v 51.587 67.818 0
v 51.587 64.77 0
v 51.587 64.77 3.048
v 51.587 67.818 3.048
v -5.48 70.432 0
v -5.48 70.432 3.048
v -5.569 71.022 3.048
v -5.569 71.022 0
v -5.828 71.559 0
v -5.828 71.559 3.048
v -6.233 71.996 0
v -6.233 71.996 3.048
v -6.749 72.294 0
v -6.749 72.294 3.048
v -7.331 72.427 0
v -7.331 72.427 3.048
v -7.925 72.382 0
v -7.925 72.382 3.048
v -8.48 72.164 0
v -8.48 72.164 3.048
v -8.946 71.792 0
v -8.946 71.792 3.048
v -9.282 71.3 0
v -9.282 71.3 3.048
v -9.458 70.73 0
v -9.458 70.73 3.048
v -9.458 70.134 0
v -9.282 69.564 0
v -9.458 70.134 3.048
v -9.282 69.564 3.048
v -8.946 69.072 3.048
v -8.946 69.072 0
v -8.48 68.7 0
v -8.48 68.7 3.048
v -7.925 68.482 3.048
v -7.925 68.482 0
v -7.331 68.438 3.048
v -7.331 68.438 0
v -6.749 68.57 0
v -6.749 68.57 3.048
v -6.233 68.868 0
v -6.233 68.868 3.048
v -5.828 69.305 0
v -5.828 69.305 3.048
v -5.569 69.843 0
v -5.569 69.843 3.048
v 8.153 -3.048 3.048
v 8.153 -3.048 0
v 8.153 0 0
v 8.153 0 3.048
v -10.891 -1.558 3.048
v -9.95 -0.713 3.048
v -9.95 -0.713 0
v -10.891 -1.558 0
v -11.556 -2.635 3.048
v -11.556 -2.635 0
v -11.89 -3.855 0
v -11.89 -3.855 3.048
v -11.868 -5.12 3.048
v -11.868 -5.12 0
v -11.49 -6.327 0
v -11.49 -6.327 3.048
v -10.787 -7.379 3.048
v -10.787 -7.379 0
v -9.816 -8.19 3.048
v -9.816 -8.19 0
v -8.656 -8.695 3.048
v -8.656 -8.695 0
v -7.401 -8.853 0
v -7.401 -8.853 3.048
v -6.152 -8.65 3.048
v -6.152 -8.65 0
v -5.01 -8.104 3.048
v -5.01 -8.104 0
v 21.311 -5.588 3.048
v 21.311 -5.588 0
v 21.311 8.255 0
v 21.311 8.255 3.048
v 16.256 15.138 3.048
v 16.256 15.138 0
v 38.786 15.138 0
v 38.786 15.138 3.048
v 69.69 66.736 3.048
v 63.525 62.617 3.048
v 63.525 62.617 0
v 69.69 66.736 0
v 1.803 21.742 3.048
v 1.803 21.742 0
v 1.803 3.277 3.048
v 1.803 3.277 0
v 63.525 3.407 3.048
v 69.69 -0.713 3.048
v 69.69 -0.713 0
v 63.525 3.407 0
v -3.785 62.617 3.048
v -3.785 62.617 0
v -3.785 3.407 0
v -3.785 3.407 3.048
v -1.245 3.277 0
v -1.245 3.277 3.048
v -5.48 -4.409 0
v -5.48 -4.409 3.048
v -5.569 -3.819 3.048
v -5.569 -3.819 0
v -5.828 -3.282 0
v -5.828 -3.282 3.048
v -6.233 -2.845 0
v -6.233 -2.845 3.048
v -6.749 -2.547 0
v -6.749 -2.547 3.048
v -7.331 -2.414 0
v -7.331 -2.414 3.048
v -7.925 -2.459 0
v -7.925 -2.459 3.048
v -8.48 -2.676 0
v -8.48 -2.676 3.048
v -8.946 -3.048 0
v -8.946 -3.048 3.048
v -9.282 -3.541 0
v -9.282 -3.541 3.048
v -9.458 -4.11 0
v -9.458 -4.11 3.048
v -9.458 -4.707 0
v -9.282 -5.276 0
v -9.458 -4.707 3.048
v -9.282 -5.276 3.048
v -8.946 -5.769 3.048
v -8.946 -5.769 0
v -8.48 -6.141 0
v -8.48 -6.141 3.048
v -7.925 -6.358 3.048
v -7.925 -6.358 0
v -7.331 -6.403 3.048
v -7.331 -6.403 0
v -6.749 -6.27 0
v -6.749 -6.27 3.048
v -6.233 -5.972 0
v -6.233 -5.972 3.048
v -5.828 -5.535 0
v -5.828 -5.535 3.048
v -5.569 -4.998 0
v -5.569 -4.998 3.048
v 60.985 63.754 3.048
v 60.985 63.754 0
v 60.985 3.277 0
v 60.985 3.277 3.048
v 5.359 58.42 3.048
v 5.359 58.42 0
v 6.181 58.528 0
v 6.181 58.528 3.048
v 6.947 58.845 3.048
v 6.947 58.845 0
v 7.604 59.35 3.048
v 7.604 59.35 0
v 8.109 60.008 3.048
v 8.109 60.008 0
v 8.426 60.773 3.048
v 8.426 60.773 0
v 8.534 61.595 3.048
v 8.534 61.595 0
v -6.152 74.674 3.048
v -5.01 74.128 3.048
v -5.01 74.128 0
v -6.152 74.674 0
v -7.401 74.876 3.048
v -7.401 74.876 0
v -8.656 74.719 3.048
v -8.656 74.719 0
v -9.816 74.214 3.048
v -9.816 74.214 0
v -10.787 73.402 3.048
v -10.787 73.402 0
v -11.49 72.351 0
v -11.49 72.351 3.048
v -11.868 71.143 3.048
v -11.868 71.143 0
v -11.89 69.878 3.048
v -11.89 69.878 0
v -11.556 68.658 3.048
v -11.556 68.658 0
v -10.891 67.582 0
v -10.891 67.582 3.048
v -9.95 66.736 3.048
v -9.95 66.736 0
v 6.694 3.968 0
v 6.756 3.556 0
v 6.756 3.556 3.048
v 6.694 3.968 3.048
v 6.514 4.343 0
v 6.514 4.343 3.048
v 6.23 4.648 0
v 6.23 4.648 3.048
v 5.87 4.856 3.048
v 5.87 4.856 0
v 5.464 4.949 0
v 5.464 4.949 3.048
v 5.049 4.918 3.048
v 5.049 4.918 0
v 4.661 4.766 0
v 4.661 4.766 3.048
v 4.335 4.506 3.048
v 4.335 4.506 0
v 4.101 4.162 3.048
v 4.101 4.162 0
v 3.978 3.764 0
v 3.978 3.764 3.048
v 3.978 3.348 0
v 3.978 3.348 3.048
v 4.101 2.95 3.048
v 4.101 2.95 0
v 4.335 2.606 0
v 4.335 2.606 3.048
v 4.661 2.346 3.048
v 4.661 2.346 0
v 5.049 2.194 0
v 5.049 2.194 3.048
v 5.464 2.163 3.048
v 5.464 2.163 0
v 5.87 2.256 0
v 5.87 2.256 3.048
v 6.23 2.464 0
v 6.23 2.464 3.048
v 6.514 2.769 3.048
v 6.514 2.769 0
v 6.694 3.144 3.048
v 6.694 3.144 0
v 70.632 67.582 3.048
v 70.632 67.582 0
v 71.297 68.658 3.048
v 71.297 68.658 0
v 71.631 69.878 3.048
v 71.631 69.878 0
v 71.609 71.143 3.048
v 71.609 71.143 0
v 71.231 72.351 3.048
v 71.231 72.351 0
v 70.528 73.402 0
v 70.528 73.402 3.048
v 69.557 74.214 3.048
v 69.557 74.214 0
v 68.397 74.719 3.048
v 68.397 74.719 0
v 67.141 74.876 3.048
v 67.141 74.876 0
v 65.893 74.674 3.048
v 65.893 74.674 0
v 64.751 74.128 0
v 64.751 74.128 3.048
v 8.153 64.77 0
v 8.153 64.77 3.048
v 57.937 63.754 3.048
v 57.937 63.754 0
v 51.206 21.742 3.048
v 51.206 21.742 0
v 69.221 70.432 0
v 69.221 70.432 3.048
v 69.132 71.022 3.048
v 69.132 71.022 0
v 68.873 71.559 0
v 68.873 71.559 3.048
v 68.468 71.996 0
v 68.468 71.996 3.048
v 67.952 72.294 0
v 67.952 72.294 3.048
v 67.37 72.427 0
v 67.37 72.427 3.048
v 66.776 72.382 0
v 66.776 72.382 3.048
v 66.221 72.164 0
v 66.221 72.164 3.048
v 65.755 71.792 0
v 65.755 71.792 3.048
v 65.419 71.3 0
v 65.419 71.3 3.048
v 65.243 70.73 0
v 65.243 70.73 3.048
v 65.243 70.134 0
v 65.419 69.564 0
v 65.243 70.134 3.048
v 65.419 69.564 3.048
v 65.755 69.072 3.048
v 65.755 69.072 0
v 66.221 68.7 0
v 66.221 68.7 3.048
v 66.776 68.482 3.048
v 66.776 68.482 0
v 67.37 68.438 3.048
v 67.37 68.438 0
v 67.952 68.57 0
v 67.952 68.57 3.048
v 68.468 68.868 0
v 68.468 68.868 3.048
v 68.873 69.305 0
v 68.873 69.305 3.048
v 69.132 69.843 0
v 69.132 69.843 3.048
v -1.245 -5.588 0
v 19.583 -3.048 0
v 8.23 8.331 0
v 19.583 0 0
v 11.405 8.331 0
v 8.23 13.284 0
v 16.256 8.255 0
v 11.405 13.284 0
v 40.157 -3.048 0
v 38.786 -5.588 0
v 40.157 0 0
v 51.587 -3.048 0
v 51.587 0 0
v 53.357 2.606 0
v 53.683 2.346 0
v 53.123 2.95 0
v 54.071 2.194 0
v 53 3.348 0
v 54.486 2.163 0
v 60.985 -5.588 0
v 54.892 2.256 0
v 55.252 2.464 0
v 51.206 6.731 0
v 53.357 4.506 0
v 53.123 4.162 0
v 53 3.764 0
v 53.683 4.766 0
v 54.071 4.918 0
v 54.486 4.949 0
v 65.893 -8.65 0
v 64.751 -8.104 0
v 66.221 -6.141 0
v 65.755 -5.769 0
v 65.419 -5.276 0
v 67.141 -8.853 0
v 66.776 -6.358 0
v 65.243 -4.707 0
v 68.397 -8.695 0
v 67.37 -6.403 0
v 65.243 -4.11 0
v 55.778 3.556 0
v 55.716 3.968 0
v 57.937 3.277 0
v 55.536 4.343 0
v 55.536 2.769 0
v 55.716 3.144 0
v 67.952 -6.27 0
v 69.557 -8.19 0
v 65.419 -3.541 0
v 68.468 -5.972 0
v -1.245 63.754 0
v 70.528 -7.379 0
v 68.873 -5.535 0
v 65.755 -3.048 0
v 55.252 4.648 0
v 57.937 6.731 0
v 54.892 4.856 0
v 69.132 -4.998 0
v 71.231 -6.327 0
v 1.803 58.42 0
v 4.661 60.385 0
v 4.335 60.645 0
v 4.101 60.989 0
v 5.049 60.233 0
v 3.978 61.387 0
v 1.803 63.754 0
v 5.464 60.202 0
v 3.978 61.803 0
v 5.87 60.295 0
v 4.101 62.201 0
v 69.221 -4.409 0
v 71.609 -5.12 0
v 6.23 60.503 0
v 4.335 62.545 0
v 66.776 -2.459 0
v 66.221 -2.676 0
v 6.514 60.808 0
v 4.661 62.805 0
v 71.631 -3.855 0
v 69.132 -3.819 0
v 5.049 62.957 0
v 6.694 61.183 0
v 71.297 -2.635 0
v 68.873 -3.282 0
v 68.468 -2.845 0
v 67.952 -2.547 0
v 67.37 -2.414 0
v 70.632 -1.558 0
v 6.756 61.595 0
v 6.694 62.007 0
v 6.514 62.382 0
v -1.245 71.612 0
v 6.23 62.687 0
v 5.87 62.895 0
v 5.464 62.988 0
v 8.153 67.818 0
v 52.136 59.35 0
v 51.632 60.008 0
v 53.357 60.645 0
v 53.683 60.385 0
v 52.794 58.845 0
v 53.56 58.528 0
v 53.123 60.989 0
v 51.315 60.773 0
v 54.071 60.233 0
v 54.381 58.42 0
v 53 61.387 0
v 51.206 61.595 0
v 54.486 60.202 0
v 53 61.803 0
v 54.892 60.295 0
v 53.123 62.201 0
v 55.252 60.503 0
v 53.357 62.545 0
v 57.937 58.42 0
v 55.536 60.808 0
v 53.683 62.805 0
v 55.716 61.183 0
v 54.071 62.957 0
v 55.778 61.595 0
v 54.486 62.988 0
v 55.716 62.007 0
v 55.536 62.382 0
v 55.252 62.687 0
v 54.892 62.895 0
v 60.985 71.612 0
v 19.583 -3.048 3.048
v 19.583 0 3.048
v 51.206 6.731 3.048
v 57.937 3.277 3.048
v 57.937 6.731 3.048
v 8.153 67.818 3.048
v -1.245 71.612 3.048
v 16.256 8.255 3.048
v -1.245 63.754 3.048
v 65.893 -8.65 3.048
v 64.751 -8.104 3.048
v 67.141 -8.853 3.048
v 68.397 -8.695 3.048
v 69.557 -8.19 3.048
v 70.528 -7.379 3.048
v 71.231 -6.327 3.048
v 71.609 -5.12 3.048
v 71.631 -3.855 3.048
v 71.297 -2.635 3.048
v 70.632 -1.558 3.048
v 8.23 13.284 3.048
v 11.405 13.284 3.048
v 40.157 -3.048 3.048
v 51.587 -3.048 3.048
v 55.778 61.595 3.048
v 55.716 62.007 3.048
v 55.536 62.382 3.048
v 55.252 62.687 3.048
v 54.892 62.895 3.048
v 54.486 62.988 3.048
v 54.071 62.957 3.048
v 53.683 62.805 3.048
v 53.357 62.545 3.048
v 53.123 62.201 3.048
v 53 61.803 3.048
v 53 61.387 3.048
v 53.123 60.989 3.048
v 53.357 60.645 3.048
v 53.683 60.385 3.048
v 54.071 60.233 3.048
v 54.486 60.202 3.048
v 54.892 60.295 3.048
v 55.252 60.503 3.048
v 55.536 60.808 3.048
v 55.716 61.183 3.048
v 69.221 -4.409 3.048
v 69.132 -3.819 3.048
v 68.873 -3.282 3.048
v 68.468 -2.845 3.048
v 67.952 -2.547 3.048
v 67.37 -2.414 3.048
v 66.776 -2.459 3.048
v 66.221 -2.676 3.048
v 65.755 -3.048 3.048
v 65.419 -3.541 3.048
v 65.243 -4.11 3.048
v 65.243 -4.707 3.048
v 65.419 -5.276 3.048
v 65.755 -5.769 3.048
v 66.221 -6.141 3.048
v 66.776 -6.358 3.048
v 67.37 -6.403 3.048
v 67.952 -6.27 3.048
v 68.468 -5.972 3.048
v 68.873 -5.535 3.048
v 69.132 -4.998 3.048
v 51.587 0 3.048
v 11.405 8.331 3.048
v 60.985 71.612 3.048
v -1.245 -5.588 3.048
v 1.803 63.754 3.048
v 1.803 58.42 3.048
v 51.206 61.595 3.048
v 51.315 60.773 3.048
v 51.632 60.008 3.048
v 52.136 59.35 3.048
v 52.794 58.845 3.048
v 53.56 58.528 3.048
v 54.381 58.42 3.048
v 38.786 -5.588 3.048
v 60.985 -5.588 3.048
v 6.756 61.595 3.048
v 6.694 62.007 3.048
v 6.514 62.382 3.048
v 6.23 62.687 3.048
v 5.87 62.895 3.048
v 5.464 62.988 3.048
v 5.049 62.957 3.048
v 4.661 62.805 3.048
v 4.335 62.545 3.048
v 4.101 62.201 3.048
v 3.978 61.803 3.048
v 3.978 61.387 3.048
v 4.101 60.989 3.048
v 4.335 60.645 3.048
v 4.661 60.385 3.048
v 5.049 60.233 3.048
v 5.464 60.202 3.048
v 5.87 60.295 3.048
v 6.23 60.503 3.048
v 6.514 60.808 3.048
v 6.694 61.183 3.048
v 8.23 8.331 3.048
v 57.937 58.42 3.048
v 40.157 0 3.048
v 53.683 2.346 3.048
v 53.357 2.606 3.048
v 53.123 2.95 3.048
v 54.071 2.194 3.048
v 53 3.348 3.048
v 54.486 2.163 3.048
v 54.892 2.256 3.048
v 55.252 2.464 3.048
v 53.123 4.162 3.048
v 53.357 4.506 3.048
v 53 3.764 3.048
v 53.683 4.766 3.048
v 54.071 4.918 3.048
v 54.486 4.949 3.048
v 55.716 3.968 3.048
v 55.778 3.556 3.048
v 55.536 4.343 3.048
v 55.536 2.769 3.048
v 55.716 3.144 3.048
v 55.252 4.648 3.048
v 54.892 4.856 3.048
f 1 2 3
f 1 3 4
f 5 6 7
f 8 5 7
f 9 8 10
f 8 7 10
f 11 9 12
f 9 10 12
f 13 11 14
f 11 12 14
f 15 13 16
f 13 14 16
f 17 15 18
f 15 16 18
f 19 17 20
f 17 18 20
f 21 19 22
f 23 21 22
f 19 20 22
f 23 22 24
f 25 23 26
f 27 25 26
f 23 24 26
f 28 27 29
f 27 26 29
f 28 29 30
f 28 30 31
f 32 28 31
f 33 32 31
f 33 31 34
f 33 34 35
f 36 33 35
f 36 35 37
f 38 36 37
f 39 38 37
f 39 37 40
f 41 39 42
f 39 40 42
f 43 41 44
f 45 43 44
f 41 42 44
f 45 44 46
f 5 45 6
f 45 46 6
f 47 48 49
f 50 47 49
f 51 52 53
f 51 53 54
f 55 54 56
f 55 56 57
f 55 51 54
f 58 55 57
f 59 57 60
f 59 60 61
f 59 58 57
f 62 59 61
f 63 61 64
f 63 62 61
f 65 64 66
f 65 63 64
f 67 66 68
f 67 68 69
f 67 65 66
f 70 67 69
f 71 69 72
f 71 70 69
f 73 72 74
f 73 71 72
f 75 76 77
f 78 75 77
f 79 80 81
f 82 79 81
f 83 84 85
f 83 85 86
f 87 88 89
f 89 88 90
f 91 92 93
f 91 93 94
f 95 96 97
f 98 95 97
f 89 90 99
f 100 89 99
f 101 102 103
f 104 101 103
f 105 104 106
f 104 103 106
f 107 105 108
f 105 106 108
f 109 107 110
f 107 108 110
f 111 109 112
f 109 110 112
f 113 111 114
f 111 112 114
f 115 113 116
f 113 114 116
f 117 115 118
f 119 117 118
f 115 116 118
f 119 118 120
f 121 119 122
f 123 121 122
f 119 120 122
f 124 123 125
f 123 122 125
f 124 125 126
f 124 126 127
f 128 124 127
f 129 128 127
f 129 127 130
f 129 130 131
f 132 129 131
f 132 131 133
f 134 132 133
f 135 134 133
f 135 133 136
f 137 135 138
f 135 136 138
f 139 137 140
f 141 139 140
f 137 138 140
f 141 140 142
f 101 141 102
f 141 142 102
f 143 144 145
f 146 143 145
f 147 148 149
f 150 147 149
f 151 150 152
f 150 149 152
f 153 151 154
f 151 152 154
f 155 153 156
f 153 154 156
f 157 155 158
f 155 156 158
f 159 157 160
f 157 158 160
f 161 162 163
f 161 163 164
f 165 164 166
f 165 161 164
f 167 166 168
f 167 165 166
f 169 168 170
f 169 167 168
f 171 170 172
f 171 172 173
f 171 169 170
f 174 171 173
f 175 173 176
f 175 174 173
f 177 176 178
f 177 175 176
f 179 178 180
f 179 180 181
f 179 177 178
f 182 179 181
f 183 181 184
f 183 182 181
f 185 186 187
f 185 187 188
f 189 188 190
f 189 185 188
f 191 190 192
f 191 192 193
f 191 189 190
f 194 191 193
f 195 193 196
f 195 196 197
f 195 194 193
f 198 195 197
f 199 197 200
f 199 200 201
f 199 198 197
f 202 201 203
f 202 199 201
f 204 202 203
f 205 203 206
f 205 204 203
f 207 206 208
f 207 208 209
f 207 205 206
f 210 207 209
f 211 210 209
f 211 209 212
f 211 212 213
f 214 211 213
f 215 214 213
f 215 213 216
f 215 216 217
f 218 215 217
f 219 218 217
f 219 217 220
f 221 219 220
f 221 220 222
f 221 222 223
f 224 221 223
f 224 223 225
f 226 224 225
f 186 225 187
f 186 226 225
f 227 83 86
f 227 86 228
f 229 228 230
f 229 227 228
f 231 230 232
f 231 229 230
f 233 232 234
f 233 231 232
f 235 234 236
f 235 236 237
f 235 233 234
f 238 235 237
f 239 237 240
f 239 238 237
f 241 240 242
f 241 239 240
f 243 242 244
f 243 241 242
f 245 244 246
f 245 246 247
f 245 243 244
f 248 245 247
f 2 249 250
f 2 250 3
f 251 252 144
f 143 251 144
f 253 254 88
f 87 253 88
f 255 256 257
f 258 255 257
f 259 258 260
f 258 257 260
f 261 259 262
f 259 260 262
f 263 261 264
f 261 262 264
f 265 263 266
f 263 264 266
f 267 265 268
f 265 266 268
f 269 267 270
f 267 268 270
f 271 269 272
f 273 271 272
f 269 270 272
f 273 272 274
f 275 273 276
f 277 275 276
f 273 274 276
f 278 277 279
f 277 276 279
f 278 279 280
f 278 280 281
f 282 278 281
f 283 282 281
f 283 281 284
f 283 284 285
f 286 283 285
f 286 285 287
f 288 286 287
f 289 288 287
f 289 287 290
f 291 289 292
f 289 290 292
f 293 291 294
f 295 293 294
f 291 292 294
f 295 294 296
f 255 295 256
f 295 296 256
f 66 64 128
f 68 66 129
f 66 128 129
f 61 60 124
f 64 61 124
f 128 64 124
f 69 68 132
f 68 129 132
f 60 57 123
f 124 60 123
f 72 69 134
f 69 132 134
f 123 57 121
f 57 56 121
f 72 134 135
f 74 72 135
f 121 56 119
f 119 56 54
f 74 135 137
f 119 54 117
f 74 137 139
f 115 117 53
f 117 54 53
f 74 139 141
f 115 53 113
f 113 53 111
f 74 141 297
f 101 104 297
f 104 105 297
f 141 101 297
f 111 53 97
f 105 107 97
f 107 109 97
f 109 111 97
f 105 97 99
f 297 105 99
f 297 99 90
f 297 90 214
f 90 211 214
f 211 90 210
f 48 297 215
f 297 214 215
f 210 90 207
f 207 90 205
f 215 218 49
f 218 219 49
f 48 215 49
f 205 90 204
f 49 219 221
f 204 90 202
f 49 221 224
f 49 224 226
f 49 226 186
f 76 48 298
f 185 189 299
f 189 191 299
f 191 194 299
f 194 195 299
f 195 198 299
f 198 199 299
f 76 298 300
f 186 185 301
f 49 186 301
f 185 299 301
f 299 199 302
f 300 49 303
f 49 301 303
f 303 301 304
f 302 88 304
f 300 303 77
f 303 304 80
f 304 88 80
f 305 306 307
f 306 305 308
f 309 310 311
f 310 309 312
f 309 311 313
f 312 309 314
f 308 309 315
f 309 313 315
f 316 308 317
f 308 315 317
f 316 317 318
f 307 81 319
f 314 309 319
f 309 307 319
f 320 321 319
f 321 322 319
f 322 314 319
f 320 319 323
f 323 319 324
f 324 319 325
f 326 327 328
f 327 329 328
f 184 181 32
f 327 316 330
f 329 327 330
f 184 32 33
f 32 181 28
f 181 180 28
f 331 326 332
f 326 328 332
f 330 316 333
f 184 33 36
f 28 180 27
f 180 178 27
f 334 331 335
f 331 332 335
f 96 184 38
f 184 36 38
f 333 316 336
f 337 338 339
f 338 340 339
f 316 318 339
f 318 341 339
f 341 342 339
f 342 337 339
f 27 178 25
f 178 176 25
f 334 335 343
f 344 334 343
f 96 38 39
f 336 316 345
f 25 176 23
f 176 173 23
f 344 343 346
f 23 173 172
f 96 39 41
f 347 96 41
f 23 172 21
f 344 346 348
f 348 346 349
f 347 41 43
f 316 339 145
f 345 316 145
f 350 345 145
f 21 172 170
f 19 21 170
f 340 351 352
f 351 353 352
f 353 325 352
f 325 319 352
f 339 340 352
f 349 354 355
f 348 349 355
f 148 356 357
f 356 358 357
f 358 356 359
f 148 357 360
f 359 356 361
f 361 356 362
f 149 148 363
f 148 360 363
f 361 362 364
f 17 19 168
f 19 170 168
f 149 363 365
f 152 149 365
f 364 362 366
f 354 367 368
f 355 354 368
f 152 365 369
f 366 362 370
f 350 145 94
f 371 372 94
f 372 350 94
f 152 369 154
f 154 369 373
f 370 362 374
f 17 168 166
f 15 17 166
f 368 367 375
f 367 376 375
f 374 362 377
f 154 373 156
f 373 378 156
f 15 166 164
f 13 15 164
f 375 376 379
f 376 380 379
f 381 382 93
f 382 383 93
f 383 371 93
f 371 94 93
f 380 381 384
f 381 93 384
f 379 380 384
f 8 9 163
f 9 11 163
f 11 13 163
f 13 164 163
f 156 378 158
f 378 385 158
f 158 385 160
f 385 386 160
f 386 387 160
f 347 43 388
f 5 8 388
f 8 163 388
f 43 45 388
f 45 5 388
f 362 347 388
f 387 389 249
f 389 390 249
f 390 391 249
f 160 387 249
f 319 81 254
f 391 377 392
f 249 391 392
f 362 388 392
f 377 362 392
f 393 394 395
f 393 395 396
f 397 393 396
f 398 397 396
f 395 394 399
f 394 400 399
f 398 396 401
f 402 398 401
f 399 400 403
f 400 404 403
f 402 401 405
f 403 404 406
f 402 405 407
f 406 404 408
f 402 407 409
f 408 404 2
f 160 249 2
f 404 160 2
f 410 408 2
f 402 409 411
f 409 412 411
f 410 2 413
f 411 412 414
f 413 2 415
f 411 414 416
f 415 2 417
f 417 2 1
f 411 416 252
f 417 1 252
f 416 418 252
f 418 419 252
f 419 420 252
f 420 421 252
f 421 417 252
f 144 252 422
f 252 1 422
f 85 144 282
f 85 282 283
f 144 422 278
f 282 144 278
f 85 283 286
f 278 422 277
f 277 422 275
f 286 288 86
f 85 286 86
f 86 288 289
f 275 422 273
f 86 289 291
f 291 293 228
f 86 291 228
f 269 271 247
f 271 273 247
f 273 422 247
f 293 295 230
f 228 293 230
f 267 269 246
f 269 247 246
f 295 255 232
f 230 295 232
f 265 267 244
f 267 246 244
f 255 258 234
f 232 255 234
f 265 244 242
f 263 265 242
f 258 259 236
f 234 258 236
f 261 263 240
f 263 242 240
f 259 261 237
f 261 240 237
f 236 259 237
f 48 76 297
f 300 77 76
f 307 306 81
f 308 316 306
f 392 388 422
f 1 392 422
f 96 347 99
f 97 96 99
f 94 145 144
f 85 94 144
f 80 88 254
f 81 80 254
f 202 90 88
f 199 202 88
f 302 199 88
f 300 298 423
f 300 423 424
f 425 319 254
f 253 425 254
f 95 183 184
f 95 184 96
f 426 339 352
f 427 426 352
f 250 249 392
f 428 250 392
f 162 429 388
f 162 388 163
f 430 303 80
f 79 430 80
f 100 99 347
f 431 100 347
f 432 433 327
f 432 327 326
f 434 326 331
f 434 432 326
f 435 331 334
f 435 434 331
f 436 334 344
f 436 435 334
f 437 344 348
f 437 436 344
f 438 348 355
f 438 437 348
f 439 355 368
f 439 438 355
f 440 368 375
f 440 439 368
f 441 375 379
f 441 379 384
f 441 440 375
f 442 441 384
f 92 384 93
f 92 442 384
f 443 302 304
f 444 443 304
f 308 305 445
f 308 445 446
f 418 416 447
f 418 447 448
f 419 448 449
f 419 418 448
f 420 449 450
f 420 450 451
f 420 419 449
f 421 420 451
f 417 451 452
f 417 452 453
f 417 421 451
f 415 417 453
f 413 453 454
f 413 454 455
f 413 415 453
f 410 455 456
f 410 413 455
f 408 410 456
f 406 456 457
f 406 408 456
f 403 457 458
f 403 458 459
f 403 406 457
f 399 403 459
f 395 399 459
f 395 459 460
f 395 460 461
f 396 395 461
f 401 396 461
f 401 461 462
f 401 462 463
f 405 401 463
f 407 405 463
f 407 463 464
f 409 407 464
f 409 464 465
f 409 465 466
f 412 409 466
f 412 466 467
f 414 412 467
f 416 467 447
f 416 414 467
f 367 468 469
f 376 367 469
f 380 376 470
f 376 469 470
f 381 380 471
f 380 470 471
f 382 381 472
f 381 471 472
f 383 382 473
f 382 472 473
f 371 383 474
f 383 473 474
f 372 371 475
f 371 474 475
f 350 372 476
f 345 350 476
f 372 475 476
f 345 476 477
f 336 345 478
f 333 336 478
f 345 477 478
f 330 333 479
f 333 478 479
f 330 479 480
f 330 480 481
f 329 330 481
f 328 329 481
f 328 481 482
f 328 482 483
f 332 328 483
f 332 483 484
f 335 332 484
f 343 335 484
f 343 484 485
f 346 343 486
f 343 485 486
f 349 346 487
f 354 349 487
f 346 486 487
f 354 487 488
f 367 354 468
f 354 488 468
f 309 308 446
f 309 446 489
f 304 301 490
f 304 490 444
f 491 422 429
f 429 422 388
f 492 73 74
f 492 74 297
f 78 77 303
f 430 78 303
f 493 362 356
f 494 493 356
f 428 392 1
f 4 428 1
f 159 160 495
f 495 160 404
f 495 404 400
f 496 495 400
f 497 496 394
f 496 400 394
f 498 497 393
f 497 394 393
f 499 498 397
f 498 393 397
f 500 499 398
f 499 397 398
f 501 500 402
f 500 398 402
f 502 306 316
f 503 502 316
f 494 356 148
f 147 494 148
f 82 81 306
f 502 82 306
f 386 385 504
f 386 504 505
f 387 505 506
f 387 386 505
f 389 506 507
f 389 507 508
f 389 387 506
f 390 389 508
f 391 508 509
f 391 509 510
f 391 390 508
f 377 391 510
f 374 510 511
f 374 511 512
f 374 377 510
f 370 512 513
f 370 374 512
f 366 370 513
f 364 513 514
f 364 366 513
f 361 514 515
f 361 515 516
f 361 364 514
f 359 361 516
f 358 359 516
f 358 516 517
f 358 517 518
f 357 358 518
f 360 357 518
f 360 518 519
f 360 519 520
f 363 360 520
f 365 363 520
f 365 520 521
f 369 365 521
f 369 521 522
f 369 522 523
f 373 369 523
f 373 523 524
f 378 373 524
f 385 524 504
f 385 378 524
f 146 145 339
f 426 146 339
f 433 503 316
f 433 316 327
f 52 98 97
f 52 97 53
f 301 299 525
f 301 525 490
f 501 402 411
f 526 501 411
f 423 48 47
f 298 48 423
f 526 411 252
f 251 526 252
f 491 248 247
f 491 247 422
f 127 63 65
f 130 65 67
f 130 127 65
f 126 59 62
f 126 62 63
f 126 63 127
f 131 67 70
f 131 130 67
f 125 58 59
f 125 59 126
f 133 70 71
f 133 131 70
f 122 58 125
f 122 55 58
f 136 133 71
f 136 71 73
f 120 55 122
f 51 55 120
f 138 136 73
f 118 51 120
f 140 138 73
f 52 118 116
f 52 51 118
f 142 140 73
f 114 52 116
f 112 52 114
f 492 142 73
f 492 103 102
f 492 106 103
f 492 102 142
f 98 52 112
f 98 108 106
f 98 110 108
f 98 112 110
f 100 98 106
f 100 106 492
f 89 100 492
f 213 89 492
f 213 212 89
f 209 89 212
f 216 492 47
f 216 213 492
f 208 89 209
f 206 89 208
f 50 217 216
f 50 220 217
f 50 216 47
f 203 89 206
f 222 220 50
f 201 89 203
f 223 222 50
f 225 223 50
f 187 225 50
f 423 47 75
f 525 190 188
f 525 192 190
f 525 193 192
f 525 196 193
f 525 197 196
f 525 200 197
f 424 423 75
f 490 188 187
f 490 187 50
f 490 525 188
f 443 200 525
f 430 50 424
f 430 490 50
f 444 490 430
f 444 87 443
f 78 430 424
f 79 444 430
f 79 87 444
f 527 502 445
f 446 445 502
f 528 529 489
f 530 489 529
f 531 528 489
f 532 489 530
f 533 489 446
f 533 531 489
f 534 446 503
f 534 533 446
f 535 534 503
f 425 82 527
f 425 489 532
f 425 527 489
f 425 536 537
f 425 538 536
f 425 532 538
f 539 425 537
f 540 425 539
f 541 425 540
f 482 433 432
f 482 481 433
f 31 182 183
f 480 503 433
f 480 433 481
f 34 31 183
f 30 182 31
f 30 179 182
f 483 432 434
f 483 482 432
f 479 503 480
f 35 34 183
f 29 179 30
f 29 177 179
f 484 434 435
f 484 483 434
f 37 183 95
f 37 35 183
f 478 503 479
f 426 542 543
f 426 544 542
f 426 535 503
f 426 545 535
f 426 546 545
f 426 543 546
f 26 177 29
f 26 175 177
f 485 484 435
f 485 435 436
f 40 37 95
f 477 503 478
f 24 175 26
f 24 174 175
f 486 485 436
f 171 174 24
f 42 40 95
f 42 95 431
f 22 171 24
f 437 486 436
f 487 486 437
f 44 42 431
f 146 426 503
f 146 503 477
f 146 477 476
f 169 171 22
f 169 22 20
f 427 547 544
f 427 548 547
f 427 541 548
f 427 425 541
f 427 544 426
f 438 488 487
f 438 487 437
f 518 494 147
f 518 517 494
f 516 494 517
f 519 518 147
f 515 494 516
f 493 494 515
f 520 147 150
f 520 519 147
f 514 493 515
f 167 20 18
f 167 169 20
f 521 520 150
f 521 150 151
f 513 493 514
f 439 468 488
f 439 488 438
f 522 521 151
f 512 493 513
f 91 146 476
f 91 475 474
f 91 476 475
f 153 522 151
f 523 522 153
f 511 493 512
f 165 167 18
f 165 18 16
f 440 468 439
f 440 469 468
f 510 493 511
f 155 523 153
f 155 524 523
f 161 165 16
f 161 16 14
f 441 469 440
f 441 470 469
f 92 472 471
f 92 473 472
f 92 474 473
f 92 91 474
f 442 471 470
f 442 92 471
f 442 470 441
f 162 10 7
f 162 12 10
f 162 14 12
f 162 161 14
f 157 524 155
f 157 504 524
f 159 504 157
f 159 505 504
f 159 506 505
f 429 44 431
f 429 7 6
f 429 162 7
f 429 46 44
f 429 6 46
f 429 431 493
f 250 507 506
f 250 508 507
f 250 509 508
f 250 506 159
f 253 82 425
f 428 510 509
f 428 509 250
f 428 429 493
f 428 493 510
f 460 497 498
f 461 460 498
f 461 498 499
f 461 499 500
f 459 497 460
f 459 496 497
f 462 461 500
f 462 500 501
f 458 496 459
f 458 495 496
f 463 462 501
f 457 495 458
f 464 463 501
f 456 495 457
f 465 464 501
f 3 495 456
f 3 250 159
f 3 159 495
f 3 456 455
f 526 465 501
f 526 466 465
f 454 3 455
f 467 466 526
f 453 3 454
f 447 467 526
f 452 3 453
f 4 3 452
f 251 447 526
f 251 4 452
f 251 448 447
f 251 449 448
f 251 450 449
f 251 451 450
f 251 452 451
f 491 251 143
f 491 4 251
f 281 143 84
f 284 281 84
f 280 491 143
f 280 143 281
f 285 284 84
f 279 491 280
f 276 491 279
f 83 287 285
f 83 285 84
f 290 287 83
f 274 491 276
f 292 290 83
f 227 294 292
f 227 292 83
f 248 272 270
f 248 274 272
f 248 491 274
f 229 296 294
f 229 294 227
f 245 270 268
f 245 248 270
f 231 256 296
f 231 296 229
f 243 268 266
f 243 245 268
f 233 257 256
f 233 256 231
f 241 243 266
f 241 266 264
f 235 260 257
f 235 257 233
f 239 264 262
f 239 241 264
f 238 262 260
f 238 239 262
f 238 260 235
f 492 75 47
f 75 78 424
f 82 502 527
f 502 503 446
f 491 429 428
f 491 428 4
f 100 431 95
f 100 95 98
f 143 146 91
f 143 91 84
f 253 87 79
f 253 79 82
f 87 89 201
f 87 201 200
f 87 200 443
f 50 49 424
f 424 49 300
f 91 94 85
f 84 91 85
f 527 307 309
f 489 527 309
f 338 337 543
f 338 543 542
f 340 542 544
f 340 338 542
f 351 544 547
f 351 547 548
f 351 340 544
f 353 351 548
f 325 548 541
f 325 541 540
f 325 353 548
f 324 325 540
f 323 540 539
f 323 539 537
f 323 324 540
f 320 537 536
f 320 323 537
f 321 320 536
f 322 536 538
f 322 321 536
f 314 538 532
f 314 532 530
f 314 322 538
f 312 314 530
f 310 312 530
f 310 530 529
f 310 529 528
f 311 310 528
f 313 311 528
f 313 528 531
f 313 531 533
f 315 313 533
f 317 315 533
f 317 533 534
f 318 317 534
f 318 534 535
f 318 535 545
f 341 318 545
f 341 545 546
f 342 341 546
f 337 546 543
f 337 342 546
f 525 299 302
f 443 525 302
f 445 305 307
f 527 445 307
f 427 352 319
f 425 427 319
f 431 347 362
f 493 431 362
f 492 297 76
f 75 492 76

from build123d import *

# Parameters (mm, degrees)
SKETCH1_R           = 1.397
SKETCH1_W           = 3.175
SKETCH1_H           = 4.953
SKETCH1_W_2         = 11.43
SKETCH1_H_2         = 3.048
SKETCH1_W_3         = 43.434
BOSS_EXTRUDE1_DEPTH = 3.048
FILLET1_R           = 2.54
SKETCH2_R           = 2
BOSS_EXTRUDE2_DEPTH = 3.048


with BuildPart() as part:
    # Sketch1 → Boss-Extrude1 (new body)
    with BuildSketch(Plane.XY):
        Polygon((-3.7846, 71.611586257), (-3.7846, -5.588), (21.3106, -5.588), (21.3106, -4.3434), (21.3106, 8.255), (16.256, 8.255), (16.256, 15.1384), (38.7858, 15.1384), (38.7858, -4.3434), (38.7858, -5.588), (63.5254, -5.588), (63.5254, 71.611586257), align=None)
        with Locations((5.3594, 3.556)):
            Circle(SKETCH1_R, mode=Mode.SUBTRACT)
        with Locations((9.8171, 10.8077)):
            Rectangle(SKETCH1_W, SKETCH1_H, mode=Mode.SUBTRACT)
        with Locations((13.8684, -1.524)):
            Rectangle(SKETCH1_W_2, SKETCH1_H_2, mode=Mode.SUBTRACT)
        with Locations((45.8724, -1.524)):
            Rectangle(SKETCH1_W_2, SKETCH1_H_2, mode=Mode.SUBTRACT)
        with Locations((54.3814, 3.556)):
            Circle(SKETCH1_R, mode=Mode.SUBTRACT)
        with BuildLine():
            Line((-1.2446, 63.754), (1.8034, 63.754))
            Line((1.8034, 63.754), (1.8034, 58.42))
            Line((1.8034, 58.42), (5.3594, 58.42))
            ThreePointArc((5.3594, 58.42), (7.60446403, 59.34993597), (8.5344, 61.595))
            Line((8.5344, 61.595), (51.2064, 61.595))
            ThreePointArc((51.2064, 61.595), (52.13633597, 59.34993597), (54.3814, 58.42))
            Line((54.3814, 58.42), (57.9374, 58.42))
            Line((57.9374, 58.42), (57.9374, 63.754))
            Line((57.9374, 63.754), (60.9854, 63.754))
            Line((60.9854, 63.754), (60.9854, 3.2766))
            Line((60.9854, 3.2766), (57.9374, 3.2766))
            Line((57.9374, 3.2766), (57.9374, 6.731))
            Line((57.9374, 6.731), (51.2064, 6.731))
            Line((51.2064, 6.731), (51.2064, 21.7424))
            Line((51.2064, 21.7424), (1.8034, 21.7424))
            Line((1.8034, 21.7424), (1.8034, 3.2766))
            Line((1.8034, 3.2766), (-1.2446, 3.2766))
            Line((-1.2446, 3.2766), (-1.2446, 63.754))
        make_face(mode=Mode.SUBTRACT)
        with Locations((5.3594, 61.595)):
            Circle(SKETCH1_R, mode=Mode.SUBTRACT)
        with Locations((29.8704, 66.294)):
            Rectangle(SKETCH1_W_3, SKETCH1_H_2, mode=Mode.SUBTRACT)
        with Locations((54.3814, 61.595)):
            Circle(SKETCH1_R, mode=Mode.SUBTRACT)
    extrude(amount=BOSS_EXTRUDE1_DEPTH)

    # Fillet1
    fillet1_edges = [part.edges().sort_by_distance(p)[0] for p in [
        (-3.7846, -5.588, 1.524),
        (-3.7846, 71.611586257, 1.524),
        (63.5254, 71.611586257, 1.524),
        (63.5254, -5.588, 1.524),
    ]]
    fillet(fillet1_edges, radius=FILLET1_R)

    # Sketch2 → Boss-Extrude2 (add)
    with BuildSketch(Plane.XY.offset(3.048)):
        with BuildLine():
            ThreePointArc((-3.055036152, 70.853136408), (-2.226043482, 71.414313021), (-1.2446, 71.611586257))
            Line((-1.2446, 71.611586257), (-5.010493887, 74.127944533))
            ThreePointArc((-5.010493887, 74.127944533), (-11.175901405, 72.901649241), (-9.949606113, 66.736241724))
            Line((-9.949606113, 66.736241724), (-3.7846, 62.616804315))
            Line((-3.7846, 62.616804315), (-3.7846, 67.961936393))
            ThreePointArc((-3.7846, 67.961936393), (-3.170149461, 69.344535157), (-3.055036152, 70.853136408))
        make_face()
        with Locations((-7.48005, 70.432093129)):
            Circle(SKETCH2_R, mode=Mode.SUBTRACT)
        with BuildLine():
            ThreePointArc((-1.2446, -5.588), (-2.226043482, -5.390726764), (-3.055036152, -4.829550151))
            ThreePointArc((-3.055036152, -4.829550151), (-3.170149461, -3.3209489), (-3.7846, -1.938350136))
            Line((-3.7846, -1.938350136), (-3.7846, 3.406781942))
            Line((-3.7846, 3.406781942), (-9.949606113, -0.712655467))
            ThreePointArc((-9.949606113, -0.712655467), (-11.175901405, -6.878062984), (-5.010493887, -8.104358276))
            Line((-5.010493887, -8.104358276), (-1.2446, -5.588))
        make_face()
        with Locations((-7.48005, -4.408506871)):
            Circle(SKETCH2_R, mode=Mode.SUBTRACT)
        with BuildLine():
            ThreePointArc((64.751293887, -8.104358276), (70.916701405, -6.878062984), (69.690406113, -0.712655467))
            Line((69.690406113, -0.712655467), (63.5254, 3.406781942))
            Line((63.5254, 3.406781942), (63.5254, -1.938350136))
            ThreePointArc((63.5254, -1.938350136), (62.910949461, -3.3209489), (62.795836152, -4.829550151))
            ThreePointArc((62.795836152, -4.829550151), (61.966843482, -5.390726764), (60.9854, -5.588))
            Line((60.9854, -5.588), (64.751293887, -8.104358276))
        make_face()
        with Locations((67.22085, -4.408506871)):
            Circle(SKETCH2_R, mode=Mode.SUBTRACT)
        with BuildLine():
            ThreePointArc((60.9854, 71.611586257), (61.966843482, 71.414313021), (62.795836152, 70.853136408))
            ThreePointArc((62.795836152, 70.853136408), (62.910949461, 69.344535157), (63.5254, 67.961936393))
            Line((63.5254, 67.961936393), (63.5254, 62.616804315))
            Line((63.5254, 62.616804315), (69.690406113, 66.736241724))
            ThreePointArc((69.690406113, 66.736241724), (70.916701405, 72.901649241), (64.751293887, 74.127944533))
            Line((64.751293887, 74.127944533), (60.9854, 71.611586257))
        make_face()
        with Locations((67.22085, 70.432093129)):
            Circle(SKETCH2_R, mode=Mode.SUBTRACT)
    extrude(amount=-BOSS_EXTRUDE2_DEPTH)


solid = part.part
